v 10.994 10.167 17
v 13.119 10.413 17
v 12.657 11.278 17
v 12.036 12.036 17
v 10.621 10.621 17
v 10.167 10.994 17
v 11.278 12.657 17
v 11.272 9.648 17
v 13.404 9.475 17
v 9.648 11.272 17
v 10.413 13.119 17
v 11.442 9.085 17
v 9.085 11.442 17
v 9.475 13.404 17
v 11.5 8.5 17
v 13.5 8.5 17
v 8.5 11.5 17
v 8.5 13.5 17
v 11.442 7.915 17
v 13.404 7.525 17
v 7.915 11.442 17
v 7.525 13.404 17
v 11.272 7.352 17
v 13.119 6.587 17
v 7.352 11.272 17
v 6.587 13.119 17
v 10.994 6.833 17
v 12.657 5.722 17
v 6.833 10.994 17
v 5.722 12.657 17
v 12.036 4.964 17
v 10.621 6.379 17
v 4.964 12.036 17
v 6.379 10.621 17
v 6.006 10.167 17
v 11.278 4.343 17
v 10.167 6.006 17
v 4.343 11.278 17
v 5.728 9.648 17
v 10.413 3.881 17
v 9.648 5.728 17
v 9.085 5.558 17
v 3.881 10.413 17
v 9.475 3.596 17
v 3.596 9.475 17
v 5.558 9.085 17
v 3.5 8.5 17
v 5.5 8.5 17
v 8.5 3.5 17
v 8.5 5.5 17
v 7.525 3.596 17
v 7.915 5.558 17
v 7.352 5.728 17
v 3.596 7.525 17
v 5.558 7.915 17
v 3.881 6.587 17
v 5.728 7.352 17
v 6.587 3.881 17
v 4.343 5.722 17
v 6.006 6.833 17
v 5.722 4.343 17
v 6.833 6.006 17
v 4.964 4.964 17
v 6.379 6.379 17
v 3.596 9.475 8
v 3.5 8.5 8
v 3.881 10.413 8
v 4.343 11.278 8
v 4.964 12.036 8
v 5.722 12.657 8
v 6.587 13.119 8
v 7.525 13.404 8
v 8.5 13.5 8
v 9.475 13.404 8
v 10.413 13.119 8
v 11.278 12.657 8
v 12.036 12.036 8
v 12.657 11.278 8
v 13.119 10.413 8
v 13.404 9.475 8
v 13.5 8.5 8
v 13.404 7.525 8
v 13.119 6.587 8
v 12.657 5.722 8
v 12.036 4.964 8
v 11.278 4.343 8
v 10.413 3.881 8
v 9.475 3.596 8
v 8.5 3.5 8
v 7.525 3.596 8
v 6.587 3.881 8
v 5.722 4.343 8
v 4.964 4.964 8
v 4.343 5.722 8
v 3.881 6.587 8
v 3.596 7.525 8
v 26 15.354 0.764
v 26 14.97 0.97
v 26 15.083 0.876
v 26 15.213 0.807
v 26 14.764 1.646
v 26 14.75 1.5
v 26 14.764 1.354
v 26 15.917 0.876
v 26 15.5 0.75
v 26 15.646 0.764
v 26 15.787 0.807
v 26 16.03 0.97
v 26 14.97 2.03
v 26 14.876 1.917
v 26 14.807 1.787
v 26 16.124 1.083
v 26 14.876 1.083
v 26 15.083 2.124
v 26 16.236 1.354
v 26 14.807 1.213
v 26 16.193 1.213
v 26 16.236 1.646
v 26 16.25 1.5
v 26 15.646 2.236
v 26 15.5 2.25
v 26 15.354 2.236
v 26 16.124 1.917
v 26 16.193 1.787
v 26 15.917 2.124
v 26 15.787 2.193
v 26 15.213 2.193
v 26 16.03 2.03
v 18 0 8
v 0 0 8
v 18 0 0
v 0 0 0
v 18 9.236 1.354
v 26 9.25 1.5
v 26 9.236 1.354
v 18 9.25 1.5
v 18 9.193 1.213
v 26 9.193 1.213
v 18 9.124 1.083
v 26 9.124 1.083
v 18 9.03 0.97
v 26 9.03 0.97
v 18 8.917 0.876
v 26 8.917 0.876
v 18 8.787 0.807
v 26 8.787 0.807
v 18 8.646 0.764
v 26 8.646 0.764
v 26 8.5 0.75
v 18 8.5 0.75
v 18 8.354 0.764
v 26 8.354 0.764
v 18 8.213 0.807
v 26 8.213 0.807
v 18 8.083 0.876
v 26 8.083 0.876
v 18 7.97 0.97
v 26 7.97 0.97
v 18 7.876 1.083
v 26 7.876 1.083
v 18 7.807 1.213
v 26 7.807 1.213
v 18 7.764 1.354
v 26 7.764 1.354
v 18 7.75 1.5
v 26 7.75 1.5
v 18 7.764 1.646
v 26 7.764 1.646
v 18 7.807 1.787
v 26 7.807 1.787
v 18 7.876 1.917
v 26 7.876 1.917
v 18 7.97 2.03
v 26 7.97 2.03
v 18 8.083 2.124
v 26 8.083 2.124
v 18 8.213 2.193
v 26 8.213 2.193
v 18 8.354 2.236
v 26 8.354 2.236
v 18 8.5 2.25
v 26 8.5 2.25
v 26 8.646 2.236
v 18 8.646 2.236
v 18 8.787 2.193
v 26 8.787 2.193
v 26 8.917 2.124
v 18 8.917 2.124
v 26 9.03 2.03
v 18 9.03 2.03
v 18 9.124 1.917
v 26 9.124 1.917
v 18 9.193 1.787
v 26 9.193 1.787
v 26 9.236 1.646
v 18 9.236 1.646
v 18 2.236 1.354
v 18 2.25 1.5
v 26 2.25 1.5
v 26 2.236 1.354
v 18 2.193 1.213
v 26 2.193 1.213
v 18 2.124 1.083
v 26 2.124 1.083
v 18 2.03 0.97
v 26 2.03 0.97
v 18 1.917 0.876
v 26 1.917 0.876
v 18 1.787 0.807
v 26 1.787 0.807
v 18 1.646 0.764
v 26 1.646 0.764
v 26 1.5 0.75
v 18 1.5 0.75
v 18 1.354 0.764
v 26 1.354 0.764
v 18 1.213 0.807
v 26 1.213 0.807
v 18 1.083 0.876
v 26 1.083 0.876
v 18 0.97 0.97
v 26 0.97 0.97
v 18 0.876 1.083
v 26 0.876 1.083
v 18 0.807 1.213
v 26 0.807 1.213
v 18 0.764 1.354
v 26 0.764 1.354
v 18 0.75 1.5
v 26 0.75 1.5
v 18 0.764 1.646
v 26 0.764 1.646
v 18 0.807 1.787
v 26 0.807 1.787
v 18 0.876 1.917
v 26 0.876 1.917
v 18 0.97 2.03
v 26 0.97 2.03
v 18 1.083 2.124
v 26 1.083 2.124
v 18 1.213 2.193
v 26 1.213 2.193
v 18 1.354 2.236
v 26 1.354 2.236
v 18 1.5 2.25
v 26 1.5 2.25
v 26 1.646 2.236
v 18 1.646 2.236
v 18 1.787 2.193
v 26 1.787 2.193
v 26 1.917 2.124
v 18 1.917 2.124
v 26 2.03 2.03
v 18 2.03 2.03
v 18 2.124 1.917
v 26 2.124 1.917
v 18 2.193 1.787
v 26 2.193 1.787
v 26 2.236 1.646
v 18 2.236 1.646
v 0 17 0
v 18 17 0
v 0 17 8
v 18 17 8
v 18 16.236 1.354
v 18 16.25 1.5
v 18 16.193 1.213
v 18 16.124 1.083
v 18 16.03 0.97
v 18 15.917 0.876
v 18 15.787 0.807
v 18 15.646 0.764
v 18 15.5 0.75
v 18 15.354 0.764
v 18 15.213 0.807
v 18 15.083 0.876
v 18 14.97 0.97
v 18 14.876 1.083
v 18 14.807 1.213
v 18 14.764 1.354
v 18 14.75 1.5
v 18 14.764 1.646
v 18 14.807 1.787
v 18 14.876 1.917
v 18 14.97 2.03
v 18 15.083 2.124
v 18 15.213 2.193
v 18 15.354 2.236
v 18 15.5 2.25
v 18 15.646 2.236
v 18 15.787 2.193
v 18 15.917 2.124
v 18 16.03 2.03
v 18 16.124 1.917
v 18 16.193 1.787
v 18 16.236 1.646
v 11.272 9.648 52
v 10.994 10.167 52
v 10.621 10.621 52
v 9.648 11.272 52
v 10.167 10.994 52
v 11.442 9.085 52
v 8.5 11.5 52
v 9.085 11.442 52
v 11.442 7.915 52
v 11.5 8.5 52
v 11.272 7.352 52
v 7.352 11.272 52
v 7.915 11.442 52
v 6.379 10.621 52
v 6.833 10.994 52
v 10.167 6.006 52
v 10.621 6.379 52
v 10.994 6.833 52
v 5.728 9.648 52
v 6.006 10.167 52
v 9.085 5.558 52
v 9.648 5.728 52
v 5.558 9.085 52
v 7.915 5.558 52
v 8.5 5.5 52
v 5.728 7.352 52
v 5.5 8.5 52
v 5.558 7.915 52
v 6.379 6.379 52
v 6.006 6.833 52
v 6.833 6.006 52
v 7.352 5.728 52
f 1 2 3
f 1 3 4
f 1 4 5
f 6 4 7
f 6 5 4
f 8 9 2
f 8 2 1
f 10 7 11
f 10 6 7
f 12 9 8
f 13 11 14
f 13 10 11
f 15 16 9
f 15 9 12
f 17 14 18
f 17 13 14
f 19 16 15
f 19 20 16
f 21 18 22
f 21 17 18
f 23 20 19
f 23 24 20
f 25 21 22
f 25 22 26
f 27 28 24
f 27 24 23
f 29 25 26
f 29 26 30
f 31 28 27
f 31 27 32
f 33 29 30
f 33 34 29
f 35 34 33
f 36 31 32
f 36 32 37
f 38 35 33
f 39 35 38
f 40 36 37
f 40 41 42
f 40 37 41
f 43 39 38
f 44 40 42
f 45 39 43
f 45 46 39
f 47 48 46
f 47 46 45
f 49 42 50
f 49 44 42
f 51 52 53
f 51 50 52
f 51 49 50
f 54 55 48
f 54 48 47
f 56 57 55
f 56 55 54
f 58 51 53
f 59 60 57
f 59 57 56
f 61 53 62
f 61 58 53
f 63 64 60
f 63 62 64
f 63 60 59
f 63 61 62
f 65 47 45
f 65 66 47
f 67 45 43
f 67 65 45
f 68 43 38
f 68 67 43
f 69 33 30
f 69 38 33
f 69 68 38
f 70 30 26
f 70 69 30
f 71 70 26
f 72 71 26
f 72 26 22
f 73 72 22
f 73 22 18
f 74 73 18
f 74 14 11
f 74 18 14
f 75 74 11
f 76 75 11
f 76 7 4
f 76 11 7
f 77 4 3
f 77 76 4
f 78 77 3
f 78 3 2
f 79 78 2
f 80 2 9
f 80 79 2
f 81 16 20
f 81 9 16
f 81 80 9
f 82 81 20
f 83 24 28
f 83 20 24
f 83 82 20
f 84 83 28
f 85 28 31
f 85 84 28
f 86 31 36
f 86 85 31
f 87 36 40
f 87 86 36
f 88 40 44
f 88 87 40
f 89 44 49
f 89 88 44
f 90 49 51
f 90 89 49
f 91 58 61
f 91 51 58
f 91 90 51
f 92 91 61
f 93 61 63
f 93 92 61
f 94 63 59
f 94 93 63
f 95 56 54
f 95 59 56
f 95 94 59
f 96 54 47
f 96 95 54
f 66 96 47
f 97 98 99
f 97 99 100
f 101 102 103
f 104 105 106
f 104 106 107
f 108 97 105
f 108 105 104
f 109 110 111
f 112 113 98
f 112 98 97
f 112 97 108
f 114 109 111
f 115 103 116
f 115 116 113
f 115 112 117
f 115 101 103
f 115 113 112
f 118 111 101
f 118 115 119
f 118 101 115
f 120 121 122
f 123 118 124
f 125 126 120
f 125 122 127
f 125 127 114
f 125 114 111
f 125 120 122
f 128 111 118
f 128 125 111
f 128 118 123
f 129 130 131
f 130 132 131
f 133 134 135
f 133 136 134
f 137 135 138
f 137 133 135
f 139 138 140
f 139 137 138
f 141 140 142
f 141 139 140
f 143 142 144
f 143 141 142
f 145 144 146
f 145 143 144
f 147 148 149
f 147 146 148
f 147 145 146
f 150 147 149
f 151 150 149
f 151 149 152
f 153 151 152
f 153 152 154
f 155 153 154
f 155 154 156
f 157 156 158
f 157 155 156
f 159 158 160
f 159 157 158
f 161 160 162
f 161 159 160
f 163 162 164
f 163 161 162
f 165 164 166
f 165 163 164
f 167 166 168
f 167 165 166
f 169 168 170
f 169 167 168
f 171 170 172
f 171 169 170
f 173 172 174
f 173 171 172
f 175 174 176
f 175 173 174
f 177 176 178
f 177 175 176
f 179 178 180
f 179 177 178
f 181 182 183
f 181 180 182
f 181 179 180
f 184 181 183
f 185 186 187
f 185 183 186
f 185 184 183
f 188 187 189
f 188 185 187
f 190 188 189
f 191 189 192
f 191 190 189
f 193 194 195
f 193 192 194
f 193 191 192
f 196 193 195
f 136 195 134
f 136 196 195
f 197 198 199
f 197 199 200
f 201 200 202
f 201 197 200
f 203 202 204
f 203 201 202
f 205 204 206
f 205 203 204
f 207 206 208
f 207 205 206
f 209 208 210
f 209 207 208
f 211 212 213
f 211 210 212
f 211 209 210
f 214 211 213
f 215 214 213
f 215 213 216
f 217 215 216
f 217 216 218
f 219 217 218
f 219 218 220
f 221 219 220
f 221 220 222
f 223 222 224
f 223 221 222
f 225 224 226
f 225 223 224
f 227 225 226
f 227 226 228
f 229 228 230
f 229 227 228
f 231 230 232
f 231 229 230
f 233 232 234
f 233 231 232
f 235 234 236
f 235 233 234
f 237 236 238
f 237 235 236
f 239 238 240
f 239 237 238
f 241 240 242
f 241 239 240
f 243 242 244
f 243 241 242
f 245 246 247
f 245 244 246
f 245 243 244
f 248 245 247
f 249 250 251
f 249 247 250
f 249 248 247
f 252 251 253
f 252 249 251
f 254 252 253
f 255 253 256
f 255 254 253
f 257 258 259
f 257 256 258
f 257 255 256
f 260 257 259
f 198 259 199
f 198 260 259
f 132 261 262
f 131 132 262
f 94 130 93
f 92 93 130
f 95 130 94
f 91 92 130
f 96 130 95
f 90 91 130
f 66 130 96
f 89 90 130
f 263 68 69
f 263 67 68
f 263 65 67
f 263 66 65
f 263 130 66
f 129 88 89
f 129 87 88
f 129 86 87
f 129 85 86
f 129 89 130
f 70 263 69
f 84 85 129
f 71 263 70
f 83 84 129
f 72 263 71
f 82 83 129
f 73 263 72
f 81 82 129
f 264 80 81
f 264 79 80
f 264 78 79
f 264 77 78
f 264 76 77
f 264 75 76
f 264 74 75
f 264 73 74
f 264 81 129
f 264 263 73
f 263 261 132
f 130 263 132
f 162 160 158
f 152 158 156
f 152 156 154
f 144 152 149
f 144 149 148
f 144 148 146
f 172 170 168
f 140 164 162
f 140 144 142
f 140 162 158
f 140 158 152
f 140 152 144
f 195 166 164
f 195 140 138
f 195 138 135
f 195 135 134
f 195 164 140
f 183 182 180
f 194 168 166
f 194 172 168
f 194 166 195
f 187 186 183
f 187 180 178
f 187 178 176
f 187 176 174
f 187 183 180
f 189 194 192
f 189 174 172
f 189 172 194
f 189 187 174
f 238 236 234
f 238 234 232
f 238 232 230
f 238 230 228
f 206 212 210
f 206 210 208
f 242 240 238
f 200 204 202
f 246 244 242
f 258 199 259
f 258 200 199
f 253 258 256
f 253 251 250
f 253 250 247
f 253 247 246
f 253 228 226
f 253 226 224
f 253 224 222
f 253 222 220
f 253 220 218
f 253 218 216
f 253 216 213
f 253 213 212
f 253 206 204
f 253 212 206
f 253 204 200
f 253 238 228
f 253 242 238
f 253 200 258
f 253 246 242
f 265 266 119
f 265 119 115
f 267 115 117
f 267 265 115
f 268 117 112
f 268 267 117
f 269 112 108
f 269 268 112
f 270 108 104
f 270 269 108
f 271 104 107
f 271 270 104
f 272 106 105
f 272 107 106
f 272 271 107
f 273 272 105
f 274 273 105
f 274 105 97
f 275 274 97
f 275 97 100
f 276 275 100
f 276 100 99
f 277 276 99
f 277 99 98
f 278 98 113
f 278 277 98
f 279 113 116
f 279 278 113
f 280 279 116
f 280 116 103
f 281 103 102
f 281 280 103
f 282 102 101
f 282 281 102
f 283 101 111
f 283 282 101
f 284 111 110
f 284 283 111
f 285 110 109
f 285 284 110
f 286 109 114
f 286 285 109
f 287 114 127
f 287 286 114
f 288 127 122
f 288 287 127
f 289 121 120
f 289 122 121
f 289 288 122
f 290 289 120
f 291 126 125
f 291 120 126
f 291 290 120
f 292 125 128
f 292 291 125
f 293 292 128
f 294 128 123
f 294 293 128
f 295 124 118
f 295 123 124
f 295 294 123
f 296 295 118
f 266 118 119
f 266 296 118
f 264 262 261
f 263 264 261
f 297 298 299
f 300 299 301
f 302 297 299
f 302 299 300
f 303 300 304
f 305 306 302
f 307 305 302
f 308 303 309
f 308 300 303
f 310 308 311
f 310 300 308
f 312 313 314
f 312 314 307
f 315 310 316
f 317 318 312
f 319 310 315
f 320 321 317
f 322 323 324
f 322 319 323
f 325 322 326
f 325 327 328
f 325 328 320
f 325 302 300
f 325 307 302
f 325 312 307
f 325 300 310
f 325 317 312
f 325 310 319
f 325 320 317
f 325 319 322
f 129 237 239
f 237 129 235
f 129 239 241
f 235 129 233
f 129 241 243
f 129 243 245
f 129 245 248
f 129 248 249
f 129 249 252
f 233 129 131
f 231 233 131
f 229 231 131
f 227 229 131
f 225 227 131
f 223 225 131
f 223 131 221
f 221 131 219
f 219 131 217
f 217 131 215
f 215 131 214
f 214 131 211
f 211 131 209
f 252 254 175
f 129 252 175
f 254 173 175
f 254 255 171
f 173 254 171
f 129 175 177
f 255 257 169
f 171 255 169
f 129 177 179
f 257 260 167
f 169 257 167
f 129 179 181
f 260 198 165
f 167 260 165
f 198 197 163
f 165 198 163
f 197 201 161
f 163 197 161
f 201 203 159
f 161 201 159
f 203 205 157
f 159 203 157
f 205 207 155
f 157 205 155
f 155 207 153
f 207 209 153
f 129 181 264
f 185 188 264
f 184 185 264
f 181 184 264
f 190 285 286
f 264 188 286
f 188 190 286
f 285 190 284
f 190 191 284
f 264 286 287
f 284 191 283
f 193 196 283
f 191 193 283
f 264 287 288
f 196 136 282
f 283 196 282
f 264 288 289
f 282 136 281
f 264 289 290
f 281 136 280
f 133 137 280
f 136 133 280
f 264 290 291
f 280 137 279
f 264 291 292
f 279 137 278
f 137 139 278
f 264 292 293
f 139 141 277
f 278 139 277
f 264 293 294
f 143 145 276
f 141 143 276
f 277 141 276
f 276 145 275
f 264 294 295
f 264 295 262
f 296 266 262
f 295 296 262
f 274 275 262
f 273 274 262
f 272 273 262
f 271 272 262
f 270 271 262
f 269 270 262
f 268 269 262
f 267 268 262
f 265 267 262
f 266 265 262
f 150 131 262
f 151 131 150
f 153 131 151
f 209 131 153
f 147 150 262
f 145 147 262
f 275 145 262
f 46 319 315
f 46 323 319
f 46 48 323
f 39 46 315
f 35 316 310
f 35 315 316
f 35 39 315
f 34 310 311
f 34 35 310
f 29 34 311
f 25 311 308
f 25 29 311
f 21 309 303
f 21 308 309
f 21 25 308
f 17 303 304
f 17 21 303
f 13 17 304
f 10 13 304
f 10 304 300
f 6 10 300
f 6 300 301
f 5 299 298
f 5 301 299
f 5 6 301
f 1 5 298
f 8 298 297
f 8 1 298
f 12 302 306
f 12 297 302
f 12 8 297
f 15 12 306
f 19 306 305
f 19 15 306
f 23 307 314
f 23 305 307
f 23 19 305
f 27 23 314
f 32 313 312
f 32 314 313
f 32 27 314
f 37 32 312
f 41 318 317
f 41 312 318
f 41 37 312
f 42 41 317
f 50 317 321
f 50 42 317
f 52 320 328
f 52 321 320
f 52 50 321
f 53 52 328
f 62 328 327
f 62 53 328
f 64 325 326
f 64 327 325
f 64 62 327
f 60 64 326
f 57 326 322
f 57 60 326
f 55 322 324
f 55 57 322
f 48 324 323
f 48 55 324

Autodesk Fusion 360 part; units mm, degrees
sketch "base" plane through (0, 0, 0) normal (0, 0, 1) x (1, 0, 0)
  line L0 (0, 0) -> (18, 0)
  line L1 (18, 0) -> (18, 17)
  line L2 (18, 17) -> (0, 17)
  line L3 (0, 17) -> (0, 0)
  dimension "d1" = 17
  dimension "d2" = 18
extrude "Extrude1" add sketch "base" along normal blind 8
sketch "pins" plane through (18, 0, 0) normal (1, 0, 0) x (0, 1, 0)
  line L0 (0, 0) -> (17, 0)
  line L1 (17, 0) -> (17, 8)
  line L2 (17, 8) -> (0, 8)
  line L3 (0, 8) -> (0, 0)
  circle A0 centre (1.5, 1.5) radius 0.75
  circle A1 centre (8.5, 1.5) radius 0.75
  circle A2 centre (15.5, 1.5) radius 0.75
  dimension "d5" = 1.5
  dimension "d6" = 1.5
  dimension "d7" = 1.5
  dimension "d12" = 14
  dimension "d13" = 0
extrude "Extrude3" add sketch "pins" along normal blind 8 contours A0 | A1 | A2
sketch "base knob" plane through (0, 0, 8) normal (0, 0, 1) x (-1, 0, 0)
  line L0 (0, -17) -> (0, 0)
  line L1 (0, 0) -> (-18, 0)
  line L2 (-18, 0) -> (-18, -17)
  line L3 (-18, -17) -> (0, -17)
  circle A0 centre (-8.5, -8.5) radius 5
  dimension "d16" = 10
  dimension "d17" = 8.5
  dimension "d18" = 8.5
extrude "Extrude4" add sketch "base knob" along normal blind 9 contours A0
sketch "knob" plane through (0, 0, 17) normal (0, 0, 1) x (-1, 0, 0)
  circle A0 centre (-8.5, -8.5) radius 5
  circle A1 centre (-8.5, -8.5) radius 3
  dimension "d21" = 6
extrude "Extrude5" add sketch "knob" along normal blind 35 contours A1
equation "d18 = d17"
